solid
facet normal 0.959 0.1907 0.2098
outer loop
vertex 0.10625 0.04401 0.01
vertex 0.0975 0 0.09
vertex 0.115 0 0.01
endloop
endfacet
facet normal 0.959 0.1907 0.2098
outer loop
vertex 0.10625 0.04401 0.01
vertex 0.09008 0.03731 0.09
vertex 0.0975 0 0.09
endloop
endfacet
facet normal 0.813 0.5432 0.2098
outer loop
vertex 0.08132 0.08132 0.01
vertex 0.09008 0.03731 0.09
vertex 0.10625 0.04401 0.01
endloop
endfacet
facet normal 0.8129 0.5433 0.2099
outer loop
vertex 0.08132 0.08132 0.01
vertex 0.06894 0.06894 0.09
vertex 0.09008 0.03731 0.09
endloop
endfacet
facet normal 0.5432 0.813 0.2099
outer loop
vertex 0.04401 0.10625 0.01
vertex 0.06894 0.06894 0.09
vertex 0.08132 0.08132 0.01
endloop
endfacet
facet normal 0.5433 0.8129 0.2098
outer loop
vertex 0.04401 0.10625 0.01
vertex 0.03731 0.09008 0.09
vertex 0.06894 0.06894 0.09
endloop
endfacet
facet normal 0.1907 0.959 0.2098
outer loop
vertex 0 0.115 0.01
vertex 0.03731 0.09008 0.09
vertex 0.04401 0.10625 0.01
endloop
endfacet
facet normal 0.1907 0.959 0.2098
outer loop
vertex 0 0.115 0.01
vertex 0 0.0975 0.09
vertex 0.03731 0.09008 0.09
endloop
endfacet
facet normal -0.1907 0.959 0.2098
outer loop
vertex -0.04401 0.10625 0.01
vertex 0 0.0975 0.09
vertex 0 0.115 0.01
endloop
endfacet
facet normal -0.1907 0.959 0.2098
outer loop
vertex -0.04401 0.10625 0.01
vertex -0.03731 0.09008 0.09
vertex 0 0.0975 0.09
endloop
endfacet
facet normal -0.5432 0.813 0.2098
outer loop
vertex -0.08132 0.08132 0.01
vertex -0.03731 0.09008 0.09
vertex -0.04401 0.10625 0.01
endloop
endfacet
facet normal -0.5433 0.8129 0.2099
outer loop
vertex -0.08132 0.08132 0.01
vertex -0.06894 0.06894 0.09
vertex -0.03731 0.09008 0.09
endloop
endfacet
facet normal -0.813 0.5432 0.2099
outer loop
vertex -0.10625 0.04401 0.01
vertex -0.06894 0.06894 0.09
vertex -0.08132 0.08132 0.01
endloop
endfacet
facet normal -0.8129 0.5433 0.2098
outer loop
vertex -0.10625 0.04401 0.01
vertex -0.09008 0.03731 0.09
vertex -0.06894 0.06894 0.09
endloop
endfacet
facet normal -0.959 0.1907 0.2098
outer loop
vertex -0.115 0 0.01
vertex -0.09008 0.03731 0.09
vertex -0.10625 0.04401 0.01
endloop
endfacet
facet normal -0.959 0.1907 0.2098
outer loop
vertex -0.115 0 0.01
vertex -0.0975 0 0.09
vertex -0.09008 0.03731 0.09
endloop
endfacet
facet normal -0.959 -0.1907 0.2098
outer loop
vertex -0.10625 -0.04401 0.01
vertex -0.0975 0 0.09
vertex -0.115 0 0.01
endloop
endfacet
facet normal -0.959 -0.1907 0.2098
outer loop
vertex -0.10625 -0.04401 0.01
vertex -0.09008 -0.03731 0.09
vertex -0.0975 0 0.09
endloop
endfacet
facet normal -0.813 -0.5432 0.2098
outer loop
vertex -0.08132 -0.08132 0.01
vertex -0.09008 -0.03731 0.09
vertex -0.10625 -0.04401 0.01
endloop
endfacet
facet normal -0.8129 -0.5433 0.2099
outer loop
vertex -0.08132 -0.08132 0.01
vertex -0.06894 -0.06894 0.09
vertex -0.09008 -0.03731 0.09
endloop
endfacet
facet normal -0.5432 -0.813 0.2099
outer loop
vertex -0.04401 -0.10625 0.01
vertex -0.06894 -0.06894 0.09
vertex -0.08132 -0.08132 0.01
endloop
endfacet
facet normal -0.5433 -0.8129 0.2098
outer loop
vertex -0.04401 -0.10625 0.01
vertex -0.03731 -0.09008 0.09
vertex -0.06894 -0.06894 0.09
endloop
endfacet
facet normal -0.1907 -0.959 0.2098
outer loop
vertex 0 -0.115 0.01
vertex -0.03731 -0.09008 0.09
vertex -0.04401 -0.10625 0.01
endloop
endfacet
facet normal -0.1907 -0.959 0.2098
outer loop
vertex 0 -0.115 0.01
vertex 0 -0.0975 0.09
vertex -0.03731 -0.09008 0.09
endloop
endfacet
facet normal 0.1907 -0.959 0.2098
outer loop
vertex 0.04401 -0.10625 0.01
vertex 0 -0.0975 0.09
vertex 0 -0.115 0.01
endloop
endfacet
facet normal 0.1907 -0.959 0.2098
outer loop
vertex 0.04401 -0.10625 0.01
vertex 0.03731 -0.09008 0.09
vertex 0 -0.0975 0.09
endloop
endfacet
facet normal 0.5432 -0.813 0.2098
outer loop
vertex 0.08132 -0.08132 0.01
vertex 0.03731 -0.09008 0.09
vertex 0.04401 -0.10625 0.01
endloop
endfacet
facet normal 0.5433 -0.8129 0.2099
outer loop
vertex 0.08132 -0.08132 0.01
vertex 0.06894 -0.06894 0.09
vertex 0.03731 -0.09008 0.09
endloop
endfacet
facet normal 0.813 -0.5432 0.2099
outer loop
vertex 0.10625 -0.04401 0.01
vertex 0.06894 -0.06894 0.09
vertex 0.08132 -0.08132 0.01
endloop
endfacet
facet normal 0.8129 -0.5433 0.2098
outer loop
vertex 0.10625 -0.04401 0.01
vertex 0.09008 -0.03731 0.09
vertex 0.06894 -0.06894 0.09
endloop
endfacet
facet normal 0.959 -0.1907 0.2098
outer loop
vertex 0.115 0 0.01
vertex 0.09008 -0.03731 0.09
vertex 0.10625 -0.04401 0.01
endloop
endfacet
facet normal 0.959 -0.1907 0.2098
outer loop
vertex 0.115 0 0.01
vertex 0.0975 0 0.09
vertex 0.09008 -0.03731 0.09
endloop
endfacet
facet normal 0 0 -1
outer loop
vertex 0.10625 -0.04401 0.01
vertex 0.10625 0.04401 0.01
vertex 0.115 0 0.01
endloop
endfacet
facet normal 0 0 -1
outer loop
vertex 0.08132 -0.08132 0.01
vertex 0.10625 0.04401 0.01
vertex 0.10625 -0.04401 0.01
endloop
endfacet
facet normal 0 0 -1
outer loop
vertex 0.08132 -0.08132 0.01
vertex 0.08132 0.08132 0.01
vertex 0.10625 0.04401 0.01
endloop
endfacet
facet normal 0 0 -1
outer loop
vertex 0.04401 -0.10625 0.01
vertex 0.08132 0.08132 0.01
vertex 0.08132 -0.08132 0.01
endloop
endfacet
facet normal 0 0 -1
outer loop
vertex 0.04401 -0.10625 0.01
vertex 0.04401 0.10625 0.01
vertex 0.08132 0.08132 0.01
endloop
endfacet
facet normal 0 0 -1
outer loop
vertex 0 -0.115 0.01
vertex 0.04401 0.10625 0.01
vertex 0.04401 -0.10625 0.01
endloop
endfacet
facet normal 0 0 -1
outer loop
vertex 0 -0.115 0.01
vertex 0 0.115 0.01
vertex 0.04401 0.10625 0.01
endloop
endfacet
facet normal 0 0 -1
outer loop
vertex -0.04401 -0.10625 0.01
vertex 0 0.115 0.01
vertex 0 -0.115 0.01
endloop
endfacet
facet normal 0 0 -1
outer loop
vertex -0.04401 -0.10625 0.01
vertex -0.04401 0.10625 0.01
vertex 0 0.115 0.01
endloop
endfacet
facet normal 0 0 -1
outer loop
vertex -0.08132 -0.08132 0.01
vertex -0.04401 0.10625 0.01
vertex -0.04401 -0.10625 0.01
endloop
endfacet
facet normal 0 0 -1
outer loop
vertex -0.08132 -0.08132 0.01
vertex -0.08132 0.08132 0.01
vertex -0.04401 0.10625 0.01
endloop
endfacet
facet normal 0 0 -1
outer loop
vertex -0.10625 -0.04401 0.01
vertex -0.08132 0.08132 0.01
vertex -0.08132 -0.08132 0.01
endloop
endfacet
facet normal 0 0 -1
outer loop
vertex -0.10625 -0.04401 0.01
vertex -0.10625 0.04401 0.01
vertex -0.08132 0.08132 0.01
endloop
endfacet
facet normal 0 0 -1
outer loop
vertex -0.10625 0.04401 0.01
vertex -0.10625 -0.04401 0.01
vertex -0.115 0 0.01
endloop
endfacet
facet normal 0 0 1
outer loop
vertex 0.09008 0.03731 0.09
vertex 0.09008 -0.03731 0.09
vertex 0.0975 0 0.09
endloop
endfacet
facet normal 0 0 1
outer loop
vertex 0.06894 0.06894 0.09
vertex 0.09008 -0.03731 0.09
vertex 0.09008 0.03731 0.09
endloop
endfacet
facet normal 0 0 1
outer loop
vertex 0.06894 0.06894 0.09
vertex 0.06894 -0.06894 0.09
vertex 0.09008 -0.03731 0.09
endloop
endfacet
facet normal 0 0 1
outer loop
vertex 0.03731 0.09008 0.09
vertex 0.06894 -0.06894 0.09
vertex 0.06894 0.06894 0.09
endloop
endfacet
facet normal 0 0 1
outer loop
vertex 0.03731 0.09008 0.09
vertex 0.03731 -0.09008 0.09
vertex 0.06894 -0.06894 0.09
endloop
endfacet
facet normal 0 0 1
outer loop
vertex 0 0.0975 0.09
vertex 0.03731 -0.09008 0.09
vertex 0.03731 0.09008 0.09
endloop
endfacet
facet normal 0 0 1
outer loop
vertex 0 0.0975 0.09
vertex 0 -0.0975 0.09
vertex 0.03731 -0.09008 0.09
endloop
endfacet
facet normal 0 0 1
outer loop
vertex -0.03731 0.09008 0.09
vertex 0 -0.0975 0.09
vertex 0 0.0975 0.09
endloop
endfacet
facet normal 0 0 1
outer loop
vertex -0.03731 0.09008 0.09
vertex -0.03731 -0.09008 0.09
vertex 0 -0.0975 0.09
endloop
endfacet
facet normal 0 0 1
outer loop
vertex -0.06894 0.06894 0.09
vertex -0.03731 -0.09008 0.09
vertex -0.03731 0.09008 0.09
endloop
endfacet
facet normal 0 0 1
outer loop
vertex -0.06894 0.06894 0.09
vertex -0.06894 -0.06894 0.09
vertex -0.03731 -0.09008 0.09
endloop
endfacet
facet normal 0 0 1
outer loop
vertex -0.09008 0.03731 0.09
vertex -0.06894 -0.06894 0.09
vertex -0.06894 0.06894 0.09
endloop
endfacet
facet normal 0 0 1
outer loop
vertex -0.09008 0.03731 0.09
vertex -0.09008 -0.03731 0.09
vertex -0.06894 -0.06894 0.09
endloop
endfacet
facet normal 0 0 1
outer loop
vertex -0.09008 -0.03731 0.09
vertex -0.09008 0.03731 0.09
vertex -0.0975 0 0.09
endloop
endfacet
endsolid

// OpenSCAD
use <lib.scad>

hd = 16;

module beaconFrameHD($fn=hd) {
	translate([0,0,0.05]) difference() {
		cyl(0.13,0.11,0.1);
		cyl(0.12,0.10,0.085);
		translate([0,0,0.1]) cyl(0.095,0.095,0.2);
		for (i = [0:1:1]) rotate([0,0,i*90]) hull() {
			translate([0,0,0.037]) box([0.14,0.3,0.001]);
			translate([0,0,-0.035]) box([0.16,0.3,0.001]);
		}
	}
}

module beaconGlassHD($fn=hd) {
	translate([0,0,0.05]) cyl(0.115,0.0975,0.08);
}

//beaconFrameHD();
beaconGlassHD();
